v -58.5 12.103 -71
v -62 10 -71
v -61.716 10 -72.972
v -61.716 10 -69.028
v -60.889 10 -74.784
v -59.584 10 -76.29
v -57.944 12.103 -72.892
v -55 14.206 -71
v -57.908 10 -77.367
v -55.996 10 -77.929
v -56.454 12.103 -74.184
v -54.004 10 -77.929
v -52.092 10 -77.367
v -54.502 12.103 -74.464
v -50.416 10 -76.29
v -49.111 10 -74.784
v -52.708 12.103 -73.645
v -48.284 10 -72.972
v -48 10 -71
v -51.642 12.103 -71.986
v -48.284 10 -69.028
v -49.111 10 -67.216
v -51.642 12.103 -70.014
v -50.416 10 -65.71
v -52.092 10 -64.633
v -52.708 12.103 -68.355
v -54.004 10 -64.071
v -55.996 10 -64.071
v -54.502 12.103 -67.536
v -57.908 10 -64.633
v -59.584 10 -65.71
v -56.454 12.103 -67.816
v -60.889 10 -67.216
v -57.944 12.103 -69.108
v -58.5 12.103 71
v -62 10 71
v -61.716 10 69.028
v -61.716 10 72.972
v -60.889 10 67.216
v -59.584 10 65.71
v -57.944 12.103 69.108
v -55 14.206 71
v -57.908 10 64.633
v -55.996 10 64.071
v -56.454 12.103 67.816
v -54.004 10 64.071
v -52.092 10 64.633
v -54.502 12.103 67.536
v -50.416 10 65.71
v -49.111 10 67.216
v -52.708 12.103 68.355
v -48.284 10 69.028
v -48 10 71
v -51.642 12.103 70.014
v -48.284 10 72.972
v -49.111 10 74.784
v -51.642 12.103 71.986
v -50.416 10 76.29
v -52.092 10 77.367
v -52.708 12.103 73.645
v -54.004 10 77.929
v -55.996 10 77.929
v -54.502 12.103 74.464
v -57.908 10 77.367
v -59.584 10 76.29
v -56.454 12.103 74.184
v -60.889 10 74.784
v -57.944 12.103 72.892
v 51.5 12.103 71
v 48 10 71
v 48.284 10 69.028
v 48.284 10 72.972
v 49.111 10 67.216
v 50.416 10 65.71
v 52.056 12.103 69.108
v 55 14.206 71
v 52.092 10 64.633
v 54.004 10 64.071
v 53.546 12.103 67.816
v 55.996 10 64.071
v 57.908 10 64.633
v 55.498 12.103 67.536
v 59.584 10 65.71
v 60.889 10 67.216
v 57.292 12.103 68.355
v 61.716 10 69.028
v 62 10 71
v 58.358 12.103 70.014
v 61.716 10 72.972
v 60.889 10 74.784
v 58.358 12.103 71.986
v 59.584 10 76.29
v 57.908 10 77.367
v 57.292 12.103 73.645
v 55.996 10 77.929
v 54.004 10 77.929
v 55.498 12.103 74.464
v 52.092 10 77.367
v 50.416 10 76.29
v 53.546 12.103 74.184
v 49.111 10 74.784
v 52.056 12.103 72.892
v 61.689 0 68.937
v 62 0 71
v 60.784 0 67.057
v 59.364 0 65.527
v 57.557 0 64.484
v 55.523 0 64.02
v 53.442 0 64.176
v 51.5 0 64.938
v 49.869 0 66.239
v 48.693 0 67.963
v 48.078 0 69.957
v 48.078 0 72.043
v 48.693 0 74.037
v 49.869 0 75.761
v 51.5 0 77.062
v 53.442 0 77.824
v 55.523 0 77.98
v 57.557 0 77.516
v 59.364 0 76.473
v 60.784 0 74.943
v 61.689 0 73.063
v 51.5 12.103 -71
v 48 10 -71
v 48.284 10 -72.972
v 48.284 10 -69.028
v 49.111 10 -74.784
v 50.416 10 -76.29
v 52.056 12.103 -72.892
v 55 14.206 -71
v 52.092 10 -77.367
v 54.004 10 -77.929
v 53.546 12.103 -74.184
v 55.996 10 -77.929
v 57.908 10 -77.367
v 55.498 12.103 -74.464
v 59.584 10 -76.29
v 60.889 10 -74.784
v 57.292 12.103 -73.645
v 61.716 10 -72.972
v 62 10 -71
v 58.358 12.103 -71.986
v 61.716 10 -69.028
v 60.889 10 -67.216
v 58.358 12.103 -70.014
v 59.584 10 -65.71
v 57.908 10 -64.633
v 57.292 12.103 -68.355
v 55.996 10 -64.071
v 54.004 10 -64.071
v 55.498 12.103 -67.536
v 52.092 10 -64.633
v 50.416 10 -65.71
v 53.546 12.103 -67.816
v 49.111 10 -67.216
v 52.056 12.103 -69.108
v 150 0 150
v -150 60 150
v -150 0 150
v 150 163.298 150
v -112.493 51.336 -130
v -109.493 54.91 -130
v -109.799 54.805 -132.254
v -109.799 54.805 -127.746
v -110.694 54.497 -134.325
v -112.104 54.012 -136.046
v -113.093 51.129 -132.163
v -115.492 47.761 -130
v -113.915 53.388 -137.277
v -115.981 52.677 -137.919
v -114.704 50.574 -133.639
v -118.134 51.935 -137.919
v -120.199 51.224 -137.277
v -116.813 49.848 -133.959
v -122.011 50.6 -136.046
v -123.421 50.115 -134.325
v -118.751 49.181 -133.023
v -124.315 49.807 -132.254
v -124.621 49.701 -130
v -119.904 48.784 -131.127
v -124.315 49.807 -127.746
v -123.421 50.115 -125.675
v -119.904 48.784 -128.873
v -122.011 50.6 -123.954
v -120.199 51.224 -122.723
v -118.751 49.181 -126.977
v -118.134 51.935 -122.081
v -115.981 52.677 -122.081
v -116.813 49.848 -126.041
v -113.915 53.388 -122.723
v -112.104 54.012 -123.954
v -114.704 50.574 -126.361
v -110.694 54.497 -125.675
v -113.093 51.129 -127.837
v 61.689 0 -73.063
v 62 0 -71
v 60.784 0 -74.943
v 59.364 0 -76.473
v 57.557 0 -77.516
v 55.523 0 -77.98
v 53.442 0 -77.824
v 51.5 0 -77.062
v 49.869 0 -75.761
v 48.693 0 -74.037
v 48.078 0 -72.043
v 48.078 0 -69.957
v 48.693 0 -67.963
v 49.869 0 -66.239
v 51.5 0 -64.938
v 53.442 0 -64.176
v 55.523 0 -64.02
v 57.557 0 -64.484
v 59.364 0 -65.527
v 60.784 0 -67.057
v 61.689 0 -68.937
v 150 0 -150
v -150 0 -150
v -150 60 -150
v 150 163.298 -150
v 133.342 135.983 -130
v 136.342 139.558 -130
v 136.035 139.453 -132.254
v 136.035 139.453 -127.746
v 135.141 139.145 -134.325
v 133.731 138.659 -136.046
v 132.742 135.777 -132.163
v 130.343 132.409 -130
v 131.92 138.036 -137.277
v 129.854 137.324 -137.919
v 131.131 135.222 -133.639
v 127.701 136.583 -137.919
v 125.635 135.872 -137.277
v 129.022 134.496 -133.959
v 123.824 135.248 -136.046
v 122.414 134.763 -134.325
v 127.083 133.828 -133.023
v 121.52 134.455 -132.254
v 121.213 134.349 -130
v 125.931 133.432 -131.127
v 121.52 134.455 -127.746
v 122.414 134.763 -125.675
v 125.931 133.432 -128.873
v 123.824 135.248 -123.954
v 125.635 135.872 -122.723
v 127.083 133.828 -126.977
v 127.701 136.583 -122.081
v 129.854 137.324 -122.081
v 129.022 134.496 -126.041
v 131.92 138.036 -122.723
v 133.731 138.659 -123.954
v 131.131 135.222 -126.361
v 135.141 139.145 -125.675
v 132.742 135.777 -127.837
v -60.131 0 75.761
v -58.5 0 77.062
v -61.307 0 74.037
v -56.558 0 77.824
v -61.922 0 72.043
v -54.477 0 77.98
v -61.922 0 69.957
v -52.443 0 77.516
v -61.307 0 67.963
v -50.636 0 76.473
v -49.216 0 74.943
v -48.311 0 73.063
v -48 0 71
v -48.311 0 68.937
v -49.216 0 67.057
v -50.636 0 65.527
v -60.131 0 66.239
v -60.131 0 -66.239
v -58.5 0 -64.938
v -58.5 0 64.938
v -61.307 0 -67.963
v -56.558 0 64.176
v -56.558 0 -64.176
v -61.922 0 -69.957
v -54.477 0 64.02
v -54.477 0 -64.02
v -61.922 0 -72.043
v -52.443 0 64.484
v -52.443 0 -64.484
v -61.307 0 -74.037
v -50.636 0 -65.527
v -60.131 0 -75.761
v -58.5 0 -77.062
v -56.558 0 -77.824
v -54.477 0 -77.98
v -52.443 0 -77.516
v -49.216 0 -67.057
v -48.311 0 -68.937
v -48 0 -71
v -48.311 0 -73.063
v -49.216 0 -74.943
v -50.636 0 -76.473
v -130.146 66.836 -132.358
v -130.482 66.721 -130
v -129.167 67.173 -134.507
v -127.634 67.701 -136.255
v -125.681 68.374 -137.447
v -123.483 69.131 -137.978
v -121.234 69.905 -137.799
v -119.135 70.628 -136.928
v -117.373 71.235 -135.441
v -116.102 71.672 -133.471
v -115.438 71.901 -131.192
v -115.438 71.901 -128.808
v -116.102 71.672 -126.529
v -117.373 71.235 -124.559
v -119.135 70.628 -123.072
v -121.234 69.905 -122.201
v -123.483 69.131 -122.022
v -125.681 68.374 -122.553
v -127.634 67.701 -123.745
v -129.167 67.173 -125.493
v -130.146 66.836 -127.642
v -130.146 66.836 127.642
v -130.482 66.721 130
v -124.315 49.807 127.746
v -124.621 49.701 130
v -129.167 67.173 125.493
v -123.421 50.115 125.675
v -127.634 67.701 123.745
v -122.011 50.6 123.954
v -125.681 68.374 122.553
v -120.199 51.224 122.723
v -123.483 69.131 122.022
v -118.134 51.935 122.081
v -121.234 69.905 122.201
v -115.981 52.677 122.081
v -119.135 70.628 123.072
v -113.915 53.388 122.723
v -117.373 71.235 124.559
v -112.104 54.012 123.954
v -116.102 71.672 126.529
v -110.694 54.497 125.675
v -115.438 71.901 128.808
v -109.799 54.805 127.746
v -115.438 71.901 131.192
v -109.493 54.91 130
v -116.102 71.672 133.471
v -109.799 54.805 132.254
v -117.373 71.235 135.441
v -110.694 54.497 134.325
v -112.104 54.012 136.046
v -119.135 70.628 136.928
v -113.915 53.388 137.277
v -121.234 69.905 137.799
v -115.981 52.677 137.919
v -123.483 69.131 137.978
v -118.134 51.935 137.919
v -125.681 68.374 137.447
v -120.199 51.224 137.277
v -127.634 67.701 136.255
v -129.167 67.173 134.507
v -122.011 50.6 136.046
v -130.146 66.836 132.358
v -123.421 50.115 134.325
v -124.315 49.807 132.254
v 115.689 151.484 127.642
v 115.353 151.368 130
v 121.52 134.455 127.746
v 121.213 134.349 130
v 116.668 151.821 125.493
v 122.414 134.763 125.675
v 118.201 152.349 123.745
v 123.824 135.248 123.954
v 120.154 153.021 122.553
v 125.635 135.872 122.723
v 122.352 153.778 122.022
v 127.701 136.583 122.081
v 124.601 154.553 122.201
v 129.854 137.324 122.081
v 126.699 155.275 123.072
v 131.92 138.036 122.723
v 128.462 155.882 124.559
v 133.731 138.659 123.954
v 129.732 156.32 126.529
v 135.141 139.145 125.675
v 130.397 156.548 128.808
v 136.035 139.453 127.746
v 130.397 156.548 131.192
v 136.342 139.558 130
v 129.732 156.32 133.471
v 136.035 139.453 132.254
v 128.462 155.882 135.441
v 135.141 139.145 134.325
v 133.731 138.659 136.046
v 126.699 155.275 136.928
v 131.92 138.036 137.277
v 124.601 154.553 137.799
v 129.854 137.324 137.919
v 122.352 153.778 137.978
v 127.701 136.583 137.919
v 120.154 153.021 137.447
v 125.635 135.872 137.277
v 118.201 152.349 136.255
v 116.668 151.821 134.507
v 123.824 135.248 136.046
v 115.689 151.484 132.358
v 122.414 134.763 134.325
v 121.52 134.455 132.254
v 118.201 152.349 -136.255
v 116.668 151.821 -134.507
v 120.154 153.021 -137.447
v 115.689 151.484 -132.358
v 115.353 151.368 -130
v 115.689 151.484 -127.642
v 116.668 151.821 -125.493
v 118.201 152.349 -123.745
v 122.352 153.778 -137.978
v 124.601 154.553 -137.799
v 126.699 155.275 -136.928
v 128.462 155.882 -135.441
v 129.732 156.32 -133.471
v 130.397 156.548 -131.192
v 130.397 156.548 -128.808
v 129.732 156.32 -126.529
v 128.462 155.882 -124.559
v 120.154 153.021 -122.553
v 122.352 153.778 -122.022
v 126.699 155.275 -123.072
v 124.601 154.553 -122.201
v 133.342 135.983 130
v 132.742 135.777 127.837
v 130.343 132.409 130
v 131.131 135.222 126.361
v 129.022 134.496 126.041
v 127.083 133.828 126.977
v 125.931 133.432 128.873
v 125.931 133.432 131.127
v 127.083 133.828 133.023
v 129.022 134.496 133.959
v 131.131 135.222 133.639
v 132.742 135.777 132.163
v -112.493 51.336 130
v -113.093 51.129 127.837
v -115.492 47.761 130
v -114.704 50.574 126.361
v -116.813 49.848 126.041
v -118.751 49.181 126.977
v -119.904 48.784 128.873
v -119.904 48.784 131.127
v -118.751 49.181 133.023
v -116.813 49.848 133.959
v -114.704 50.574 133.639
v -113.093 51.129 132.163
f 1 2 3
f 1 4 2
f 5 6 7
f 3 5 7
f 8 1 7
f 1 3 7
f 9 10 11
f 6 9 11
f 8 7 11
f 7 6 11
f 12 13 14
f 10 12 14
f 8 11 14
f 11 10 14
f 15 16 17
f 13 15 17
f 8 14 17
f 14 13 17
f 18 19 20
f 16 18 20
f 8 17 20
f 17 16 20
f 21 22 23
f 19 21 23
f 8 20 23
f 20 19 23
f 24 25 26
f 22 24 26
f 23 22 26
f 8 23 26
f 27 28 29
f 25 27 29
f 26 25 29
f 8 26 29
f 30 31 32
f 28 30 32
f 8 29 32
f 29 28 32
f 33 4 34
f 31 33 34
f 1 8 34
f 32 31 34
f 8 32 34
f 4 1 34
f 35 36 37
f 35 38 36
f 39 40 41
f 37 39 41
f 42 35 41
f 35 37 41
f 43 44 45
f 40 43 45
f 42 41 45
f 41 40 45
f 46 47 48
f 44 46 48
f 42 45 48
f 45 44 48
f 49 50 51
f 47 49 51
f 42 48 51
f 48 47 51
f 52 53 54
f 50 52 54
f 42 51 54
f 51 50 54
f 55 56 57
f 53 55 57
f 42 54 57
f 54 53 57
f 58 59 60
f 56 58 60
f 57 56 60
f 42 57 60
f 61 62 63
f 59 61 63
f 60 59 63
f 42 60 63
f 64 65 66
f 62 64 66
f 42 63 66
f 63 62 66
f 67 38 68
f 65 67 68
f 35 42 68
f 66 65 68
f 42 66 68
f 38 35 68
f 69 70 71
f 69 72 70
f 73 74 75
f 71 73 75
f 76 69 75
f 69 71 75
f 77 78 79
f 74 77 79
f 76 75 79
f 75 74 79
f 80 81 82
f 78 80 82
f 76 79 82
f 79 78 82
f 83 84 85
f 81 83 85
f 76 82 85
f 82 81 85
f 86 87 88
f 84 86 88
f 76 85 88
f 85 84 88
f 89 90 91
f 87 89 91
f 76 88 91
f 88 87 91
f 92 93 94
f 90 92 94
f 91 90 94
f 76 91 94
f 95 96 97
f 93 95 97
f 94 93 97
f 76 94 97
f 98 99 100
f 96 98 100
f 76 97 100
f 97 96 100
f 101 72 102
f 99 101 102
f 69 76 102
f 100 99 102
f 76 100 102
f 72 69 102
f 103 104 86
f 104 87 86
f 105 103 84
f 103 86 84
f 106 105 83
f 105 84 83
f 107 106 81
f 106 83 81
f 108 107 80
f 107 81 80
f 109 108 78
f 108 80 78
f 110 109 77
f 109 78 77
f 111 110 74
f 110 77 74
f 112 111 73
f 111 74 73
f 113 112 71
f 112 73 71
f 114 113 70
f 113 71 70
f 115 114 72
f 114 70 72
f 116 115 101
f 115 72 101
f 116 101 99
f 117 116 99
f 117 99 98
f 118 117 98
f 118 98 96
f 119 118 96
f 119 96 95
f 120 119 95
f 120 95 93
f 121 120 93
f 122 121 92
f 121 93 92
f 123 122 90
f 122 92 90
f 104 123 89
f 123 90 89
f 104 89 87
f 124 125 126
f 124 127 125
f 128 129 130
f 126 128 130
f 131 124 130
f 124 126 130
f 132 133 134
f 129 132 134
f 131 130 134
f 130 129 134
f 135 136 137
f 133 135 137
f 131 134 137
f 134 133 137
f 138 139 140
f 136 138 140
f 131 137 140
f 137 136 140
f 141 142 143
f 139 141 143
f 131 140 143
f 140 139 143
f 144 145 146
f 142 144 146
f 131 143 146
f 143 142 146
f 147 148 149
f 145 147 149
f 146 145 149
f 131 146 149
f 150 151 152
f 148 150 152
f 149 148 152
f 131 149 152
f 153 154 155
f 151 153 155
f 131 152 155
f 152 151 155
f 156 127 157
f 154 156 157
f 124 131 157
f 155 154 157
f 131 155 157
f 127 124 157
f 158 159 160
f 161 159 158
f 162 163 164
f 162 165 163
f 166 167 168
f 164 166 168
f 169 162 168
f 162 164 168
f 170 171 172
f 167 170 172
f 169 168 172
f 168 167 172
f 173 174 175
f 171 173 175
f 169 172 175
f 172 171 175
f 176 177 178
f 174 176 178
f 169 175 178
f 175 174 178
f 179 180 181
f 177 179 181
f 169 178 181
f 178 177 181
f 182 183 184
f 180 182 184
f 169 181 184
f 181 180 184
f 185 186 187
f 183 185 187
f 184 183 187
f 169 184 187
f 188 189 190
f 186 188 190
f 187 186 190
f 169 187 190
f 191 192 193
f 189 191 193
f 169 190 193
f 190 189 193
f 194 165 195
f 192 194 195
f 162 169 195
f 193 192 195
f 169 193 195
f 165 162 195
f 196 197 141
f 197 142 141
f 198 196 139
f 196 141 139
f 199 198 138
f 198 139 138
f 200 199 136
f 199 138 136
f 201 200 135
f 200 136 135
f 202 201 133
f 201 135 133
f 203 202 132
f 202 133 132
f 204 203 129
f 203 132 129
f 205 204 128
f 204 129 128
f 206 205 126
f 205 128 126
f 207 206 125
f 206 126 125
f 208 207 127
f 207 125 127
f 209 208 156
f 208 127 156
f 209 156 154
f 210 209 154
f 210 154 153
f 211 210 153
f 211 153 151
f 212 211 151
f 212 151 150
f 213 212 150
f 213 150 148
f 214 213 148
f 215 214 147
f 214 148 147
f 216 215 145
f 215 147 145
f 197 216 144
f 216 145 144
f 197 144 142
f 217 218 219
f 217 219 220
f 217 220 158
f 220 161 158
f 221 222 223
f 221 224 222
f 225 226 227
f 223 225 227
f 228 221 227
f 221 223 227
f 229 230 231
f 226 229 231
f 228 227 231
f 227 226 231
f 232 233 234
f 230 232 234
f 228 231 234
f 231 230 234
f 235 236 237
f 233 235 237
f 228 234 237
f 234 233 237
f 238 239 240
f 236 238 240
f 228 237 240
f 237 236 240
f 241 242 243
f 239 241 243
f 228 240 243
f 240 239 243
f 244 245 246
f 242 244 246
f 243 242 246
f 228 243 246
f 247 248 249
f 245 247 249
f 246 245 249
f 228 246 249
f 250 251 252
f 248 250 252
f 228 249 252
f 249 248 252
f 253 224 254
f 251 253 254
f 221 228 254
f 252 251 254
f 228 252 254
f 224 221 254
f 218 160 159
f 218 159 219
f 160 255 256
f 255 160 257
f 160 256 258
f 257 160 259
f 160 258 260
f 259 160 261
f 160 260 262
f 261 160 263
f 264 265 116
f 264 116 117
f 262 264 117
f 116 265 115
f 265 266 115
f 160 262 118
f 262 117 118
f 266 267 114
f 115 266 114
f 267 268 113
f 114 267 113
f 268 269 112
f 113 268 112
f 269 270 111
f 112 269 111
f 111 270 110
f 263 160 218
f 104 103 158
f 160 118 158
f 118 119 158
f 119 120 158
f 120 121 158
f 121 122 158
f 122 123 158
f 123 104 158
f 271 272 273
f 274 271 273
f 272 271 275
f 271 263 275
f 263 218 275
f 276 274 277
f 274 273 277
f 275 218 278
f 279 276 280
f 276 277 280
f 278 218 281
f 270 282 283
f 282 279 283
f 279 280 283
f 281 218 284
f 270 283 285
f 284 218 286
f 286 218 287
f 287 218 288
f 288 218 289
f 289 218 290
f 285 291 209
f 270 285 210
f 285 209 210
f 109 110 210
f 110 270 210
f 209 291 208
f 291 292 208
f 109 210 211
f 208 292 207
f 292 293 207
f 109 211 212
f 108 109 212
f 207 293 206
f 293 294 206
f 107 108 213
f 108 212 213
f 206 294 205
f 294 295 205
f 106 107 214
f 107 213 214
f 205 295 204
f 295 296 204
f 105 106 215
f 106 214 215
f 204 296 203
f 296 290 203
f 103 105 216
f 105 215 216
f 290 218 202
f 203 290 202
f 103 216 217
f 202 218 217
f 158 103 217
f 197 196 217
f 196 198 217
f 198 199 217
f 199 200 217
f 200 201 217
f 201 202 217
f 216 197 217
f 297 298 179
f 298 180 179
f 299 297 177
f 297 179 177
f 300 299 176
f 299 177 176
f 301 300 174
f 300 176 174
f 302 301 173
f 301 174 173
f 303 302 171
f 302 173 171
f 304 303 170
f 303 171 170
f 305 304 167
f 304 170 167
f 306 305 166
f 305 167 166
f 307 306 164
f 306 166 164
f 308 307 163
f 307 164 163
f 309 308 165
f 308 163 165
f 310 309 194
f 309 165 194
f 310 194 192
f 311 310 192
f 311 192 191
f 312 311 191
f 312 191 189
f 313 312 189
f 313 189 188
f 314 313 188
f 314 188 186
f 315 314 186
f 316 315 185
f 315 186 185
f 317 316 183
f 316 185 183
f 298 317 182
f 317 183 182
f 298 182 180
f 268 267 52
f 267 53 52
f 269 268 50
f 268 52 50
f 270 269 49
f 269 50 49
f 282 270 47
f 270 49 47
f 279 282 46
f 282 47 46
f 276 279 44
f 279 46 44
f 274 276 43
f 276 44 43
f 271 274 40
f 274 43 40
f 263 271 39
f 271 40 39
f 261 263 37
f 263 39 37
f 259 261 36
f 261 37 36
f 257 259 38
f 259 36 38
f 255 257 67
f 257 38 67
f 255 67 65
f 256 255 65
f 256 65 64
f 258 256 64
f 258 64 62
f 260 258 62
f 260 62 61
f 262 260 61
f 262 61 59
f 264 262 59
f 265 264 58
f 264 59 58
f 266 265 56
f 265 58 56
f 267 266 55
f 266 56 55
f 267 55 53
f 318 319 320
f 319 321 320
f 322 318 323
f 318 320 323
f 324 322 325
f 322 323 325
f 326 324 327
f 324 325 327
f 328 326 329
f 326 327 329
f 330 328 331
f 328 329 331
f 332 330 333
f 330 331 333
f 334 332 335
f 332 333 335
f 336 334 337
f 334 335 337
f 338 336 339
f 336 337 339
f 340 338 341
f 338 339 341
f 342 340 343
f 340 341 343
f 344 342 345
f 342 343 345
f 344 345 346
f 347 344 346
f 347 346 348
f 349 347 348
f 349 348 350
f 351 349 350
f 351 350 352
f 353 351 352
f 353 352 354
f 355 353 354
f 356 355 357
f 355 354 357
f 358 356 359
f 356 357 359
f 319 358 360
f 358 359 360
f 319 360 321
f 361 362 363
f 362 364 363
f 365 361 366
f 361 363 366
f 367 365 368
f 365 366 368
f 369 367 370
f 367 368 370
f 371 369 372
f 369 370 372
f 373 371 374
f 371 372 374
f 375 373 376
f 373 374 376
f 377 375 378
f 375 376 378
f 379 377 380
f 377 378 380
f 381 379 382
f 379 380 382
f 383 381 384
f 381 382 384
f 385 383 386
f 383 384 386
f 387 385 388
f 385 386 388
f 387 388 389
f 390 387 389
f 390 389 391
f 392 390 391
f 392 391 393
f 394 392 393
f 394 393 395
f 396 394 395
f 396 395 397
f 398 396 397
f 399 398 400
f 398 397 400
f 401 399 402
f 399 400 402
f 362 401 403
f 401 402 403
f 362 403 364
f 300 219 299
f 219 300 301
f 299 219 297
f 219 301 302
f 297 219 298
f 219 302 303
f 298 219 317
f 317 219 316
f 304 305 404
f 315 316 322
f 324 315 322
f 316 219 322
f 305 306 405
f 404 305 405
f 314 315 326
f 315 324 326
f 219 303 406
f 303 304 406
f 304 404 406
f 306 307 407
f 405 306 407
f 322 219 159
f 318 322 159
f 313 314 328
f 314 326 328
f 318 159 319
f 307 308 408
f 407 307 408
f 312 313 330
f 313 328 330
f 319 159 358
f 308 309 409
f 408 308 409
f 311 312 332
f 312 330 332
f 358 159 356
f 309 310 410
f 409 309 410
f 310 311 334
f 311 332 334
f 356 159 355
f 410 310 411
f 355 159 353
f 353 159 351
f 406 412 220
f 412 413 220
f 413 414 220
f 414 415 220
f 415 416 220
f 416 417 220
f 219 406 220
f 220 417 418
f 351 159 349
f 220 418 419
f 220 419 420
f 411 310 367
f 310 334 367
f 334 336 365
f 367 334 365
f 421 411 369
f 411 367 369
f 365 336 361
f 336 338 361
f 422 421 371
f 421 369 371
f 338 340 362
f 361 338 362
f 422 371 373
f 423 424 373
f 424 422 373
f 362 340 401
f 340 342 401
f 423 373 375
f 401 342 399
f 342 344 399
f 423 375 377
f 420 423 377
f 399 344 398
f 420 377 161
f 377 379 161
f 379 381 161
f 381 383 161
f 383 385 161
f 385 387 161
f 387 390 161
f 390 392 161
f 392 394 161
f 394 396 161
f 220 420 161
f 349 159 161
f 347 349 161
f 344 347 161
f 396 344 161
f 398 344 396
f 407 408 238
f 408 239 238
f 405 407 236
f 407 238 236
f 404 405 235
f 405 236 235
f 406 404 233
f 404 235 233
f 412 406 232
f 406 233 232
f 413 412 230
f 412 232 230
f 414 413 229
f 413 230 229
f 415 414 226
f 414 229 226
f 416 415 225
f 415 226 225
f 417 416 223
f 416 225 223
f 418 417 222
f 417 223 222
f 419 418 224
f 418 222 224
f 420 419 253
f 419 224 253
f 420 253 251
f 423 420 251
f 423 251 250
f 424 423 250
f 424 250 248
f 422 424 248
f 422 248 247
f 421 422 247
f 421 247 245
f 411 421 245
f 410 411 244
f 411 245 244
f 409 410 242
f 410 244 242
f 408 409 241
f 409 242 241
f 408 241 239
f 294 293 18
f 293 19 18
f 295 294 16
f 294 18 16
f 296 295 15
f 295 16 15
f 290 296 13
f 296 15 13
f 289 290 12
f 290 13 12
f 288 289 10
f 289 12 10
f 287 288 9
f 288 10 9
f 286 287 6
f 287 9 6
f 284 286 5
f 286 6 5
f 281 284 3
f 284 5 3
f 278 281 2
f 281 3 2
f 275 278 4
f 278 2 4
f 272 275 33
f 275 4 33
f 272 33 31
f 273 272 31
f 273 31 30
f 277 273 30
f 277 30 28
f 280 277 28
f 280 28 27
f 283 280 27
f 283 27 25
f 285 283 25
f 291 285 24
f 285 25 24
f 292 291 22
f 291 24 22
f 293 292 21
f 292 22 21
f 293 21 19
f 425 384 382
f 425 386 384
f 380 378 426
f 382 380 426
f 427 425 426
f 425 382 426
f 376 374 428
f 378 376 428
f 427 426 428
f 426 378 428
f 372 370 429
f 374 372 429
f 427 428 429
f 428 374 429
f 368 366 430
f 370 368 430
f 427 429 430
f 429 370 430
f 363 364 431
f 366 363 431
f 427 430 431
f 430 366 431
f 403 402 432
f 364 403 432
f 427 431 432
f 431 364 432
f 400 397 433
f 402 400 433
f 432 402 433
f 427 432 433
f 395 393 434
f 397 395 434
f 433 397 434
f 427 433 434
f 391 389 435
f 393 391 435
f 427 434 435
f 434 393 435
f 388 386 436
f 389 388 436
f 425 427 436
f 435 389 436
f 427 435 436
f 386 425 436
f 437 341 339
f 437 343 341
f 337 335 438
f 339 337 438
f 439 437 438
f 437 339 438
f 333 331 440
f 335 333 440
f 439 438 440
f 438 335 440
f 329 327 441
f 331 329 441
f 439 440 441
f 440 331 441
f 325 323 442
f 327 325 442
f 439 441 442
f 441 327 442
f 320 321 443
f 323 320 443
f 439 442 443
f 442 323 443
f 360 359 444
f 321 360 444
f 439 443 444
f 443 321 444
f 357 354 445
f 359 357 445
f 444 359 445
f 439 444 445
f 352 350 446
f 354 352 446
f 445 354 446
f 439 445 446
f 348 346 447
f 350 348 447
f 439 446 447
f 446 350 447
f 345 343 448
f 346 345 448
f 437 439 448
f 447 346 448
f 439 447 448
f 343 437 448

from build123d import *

# Parameters (mm, degrees)
ESBO_O1_W                            = 300
ESBO_O1_H                            = 300
RESSALTO_EXTRUS_O1_DEPTH             = 60
FURO_ROSCADO_DE_M16X2_01_D           = 14
FURO_ROSCADO_DE_M16X2_01_DEPTH       = 10
FURO_ROSCADO_DE_M16X2_01_TIP         = 4.206024333
RESSALTO_EXTRUS_O2_REACH             = 152
RESSALTO_EXTRUS_O2_DIRECTION_2_REACH = 152
FURO_ROSCADO_DE_M18X2_01_D           = 16
FURO_ROSCADO_DE_M18X2_01_DEPTH       = 18
FURO_ROSCADO_DE_M18X2_01_TIP         = 4.806884952


with BuildPart() as part:
    # Esboço1 → Ressalto-extrusão1 (new body)
    with BuildSketch(Plane(origin=(0, 0, 0), x_dir=(1, 0, 0), z_dir=(0, 1, 0))):
        Rectangle(ESBO_O1_W, ESBO_O1_H)
    extrude(amount=RESSALTO_EXTRUS_O1_DEPTH)

    # Furo roscado de M16x2.01
    with Locations(Plane(origin=(0, 0, 0), x_dir=(-1, 0, 0), z_dir=(0, -1, 0))):
        with Locations((55, -71), (-55, -71), (-55, 71), (55, 71)):
            Hole(FURO_ROSCADO_DE_M16X2_01_D / 2, depth=FURO_ROSCADO_DE_M16X2_01_DEPTH)
            with Locations((0, 0, -(FURO_ROSCADO_DE_M16X2_01_DEPTH + FURO_ROSCADO_DE_M16X2_01_TIP / 2))):  # 118° drill point
                Cone(0, FURO_ROSCADO_DE_M16X2_01_D / 2, FURO_ROSCADO_DE_M16X2_01_TIP, mode=Mode.SUBTRACT)

    # Ressalto-extrusão2: up to this face of the body (flat: up to its plane)
    ressalto_extrus_o2_end = Plane(part.part.faces().sort_by_distance((0, 30, 150))[0])
    # Esboço12 → Ressalto-extrusão2 (add, up to the picked face)
    with BuildSketch(Plane.XY, mode=Mode.PRIVATE) as ressalto_extrus_o2_sk1:
        Polygon((-150, 60), (150, 163.298283987), (150, 60), align=None)
    ressalto_extrus_o2_tool1 = split(extrude(ressalto_extrus_o2_sk1.sketch, amount=RESSALTO_EXTRUS_O2_REACH, mode=Mode.PRIVATE), bisect_by=ressalto_extrus_o2_end, keep=Keep.BOTH, mode=Mode.PRIVATE)
    add(ressalto_extrus_o2_tool1.solids().sort_by_distance((50, 94.432761, 0))[0])

    # Ressalto-extrusão2 direction 2: up to this face of the body (flat: up to its plane)
    ressalto_extrus_o2_direction_2_end = Plane(part.part.faces().sort_by_distance((0, 30, -150))[0])
    # Esboço12 → Ressalto-extrusão2 direction 2 (add, up to the picked face)
    with BuildSketch(Plane.XY, mode=Mode.PRIVATE) as ressalto_extrus_o2_direction_2_sk1:
        Polygon((-150, 60), (150, 163.298283987), (150, 60), align=None)
    ressalto_extrus_o2_direction_2_tool1 = split(extrude(ressalto_extrus_o2_direction_2_sk1.sketch, amount=-RESSALTO_EXTRUS_O2_DIRECTION_2_REACH, mode=Mode.PRIVATE), bisect_by=ressalto_extrus_o2_direction_2_end, keep=Keep.BOTH, mode=Mode.PRIVATE)
    add(ressalto_extrus_o2_direction_2_tool1.solids().sort_by_distance((50, 94.432761, 0))[0])

    # Furo roscado de M18x2.01
    with Locations(Plane(origin=(-34.369037739, 99.814933258, 0), x_dir=(0.945518576, 0.325568154, 0), z_dir=(-0.325568154, 0.945518576, 0))):
        with Locations((-93.650594894, 130), (166.349405106, 130), (166.349405106, -130), (-93.650594894, -130)):
            Hole(FURO_ROSCADO_DE_M18X2_01_D / 2, depth=FURO_ROSCADO_DE_M18X2_01_DEPTH)
            with Locations((0, 0, -(FURO_ROSCADO_DE_M18X2_01_DEPTH + FURO_ROSCADO_DE_M18X2_01_TIP / 2))):  # 118° drill point
                Cone(0, FURO_ROSCADO_DE_M18X2_01_D / 2, FURO_ROSCADO_DE_M18X2_01_TIP, mode=Mode.SUBTRACT)


solid = part.part
